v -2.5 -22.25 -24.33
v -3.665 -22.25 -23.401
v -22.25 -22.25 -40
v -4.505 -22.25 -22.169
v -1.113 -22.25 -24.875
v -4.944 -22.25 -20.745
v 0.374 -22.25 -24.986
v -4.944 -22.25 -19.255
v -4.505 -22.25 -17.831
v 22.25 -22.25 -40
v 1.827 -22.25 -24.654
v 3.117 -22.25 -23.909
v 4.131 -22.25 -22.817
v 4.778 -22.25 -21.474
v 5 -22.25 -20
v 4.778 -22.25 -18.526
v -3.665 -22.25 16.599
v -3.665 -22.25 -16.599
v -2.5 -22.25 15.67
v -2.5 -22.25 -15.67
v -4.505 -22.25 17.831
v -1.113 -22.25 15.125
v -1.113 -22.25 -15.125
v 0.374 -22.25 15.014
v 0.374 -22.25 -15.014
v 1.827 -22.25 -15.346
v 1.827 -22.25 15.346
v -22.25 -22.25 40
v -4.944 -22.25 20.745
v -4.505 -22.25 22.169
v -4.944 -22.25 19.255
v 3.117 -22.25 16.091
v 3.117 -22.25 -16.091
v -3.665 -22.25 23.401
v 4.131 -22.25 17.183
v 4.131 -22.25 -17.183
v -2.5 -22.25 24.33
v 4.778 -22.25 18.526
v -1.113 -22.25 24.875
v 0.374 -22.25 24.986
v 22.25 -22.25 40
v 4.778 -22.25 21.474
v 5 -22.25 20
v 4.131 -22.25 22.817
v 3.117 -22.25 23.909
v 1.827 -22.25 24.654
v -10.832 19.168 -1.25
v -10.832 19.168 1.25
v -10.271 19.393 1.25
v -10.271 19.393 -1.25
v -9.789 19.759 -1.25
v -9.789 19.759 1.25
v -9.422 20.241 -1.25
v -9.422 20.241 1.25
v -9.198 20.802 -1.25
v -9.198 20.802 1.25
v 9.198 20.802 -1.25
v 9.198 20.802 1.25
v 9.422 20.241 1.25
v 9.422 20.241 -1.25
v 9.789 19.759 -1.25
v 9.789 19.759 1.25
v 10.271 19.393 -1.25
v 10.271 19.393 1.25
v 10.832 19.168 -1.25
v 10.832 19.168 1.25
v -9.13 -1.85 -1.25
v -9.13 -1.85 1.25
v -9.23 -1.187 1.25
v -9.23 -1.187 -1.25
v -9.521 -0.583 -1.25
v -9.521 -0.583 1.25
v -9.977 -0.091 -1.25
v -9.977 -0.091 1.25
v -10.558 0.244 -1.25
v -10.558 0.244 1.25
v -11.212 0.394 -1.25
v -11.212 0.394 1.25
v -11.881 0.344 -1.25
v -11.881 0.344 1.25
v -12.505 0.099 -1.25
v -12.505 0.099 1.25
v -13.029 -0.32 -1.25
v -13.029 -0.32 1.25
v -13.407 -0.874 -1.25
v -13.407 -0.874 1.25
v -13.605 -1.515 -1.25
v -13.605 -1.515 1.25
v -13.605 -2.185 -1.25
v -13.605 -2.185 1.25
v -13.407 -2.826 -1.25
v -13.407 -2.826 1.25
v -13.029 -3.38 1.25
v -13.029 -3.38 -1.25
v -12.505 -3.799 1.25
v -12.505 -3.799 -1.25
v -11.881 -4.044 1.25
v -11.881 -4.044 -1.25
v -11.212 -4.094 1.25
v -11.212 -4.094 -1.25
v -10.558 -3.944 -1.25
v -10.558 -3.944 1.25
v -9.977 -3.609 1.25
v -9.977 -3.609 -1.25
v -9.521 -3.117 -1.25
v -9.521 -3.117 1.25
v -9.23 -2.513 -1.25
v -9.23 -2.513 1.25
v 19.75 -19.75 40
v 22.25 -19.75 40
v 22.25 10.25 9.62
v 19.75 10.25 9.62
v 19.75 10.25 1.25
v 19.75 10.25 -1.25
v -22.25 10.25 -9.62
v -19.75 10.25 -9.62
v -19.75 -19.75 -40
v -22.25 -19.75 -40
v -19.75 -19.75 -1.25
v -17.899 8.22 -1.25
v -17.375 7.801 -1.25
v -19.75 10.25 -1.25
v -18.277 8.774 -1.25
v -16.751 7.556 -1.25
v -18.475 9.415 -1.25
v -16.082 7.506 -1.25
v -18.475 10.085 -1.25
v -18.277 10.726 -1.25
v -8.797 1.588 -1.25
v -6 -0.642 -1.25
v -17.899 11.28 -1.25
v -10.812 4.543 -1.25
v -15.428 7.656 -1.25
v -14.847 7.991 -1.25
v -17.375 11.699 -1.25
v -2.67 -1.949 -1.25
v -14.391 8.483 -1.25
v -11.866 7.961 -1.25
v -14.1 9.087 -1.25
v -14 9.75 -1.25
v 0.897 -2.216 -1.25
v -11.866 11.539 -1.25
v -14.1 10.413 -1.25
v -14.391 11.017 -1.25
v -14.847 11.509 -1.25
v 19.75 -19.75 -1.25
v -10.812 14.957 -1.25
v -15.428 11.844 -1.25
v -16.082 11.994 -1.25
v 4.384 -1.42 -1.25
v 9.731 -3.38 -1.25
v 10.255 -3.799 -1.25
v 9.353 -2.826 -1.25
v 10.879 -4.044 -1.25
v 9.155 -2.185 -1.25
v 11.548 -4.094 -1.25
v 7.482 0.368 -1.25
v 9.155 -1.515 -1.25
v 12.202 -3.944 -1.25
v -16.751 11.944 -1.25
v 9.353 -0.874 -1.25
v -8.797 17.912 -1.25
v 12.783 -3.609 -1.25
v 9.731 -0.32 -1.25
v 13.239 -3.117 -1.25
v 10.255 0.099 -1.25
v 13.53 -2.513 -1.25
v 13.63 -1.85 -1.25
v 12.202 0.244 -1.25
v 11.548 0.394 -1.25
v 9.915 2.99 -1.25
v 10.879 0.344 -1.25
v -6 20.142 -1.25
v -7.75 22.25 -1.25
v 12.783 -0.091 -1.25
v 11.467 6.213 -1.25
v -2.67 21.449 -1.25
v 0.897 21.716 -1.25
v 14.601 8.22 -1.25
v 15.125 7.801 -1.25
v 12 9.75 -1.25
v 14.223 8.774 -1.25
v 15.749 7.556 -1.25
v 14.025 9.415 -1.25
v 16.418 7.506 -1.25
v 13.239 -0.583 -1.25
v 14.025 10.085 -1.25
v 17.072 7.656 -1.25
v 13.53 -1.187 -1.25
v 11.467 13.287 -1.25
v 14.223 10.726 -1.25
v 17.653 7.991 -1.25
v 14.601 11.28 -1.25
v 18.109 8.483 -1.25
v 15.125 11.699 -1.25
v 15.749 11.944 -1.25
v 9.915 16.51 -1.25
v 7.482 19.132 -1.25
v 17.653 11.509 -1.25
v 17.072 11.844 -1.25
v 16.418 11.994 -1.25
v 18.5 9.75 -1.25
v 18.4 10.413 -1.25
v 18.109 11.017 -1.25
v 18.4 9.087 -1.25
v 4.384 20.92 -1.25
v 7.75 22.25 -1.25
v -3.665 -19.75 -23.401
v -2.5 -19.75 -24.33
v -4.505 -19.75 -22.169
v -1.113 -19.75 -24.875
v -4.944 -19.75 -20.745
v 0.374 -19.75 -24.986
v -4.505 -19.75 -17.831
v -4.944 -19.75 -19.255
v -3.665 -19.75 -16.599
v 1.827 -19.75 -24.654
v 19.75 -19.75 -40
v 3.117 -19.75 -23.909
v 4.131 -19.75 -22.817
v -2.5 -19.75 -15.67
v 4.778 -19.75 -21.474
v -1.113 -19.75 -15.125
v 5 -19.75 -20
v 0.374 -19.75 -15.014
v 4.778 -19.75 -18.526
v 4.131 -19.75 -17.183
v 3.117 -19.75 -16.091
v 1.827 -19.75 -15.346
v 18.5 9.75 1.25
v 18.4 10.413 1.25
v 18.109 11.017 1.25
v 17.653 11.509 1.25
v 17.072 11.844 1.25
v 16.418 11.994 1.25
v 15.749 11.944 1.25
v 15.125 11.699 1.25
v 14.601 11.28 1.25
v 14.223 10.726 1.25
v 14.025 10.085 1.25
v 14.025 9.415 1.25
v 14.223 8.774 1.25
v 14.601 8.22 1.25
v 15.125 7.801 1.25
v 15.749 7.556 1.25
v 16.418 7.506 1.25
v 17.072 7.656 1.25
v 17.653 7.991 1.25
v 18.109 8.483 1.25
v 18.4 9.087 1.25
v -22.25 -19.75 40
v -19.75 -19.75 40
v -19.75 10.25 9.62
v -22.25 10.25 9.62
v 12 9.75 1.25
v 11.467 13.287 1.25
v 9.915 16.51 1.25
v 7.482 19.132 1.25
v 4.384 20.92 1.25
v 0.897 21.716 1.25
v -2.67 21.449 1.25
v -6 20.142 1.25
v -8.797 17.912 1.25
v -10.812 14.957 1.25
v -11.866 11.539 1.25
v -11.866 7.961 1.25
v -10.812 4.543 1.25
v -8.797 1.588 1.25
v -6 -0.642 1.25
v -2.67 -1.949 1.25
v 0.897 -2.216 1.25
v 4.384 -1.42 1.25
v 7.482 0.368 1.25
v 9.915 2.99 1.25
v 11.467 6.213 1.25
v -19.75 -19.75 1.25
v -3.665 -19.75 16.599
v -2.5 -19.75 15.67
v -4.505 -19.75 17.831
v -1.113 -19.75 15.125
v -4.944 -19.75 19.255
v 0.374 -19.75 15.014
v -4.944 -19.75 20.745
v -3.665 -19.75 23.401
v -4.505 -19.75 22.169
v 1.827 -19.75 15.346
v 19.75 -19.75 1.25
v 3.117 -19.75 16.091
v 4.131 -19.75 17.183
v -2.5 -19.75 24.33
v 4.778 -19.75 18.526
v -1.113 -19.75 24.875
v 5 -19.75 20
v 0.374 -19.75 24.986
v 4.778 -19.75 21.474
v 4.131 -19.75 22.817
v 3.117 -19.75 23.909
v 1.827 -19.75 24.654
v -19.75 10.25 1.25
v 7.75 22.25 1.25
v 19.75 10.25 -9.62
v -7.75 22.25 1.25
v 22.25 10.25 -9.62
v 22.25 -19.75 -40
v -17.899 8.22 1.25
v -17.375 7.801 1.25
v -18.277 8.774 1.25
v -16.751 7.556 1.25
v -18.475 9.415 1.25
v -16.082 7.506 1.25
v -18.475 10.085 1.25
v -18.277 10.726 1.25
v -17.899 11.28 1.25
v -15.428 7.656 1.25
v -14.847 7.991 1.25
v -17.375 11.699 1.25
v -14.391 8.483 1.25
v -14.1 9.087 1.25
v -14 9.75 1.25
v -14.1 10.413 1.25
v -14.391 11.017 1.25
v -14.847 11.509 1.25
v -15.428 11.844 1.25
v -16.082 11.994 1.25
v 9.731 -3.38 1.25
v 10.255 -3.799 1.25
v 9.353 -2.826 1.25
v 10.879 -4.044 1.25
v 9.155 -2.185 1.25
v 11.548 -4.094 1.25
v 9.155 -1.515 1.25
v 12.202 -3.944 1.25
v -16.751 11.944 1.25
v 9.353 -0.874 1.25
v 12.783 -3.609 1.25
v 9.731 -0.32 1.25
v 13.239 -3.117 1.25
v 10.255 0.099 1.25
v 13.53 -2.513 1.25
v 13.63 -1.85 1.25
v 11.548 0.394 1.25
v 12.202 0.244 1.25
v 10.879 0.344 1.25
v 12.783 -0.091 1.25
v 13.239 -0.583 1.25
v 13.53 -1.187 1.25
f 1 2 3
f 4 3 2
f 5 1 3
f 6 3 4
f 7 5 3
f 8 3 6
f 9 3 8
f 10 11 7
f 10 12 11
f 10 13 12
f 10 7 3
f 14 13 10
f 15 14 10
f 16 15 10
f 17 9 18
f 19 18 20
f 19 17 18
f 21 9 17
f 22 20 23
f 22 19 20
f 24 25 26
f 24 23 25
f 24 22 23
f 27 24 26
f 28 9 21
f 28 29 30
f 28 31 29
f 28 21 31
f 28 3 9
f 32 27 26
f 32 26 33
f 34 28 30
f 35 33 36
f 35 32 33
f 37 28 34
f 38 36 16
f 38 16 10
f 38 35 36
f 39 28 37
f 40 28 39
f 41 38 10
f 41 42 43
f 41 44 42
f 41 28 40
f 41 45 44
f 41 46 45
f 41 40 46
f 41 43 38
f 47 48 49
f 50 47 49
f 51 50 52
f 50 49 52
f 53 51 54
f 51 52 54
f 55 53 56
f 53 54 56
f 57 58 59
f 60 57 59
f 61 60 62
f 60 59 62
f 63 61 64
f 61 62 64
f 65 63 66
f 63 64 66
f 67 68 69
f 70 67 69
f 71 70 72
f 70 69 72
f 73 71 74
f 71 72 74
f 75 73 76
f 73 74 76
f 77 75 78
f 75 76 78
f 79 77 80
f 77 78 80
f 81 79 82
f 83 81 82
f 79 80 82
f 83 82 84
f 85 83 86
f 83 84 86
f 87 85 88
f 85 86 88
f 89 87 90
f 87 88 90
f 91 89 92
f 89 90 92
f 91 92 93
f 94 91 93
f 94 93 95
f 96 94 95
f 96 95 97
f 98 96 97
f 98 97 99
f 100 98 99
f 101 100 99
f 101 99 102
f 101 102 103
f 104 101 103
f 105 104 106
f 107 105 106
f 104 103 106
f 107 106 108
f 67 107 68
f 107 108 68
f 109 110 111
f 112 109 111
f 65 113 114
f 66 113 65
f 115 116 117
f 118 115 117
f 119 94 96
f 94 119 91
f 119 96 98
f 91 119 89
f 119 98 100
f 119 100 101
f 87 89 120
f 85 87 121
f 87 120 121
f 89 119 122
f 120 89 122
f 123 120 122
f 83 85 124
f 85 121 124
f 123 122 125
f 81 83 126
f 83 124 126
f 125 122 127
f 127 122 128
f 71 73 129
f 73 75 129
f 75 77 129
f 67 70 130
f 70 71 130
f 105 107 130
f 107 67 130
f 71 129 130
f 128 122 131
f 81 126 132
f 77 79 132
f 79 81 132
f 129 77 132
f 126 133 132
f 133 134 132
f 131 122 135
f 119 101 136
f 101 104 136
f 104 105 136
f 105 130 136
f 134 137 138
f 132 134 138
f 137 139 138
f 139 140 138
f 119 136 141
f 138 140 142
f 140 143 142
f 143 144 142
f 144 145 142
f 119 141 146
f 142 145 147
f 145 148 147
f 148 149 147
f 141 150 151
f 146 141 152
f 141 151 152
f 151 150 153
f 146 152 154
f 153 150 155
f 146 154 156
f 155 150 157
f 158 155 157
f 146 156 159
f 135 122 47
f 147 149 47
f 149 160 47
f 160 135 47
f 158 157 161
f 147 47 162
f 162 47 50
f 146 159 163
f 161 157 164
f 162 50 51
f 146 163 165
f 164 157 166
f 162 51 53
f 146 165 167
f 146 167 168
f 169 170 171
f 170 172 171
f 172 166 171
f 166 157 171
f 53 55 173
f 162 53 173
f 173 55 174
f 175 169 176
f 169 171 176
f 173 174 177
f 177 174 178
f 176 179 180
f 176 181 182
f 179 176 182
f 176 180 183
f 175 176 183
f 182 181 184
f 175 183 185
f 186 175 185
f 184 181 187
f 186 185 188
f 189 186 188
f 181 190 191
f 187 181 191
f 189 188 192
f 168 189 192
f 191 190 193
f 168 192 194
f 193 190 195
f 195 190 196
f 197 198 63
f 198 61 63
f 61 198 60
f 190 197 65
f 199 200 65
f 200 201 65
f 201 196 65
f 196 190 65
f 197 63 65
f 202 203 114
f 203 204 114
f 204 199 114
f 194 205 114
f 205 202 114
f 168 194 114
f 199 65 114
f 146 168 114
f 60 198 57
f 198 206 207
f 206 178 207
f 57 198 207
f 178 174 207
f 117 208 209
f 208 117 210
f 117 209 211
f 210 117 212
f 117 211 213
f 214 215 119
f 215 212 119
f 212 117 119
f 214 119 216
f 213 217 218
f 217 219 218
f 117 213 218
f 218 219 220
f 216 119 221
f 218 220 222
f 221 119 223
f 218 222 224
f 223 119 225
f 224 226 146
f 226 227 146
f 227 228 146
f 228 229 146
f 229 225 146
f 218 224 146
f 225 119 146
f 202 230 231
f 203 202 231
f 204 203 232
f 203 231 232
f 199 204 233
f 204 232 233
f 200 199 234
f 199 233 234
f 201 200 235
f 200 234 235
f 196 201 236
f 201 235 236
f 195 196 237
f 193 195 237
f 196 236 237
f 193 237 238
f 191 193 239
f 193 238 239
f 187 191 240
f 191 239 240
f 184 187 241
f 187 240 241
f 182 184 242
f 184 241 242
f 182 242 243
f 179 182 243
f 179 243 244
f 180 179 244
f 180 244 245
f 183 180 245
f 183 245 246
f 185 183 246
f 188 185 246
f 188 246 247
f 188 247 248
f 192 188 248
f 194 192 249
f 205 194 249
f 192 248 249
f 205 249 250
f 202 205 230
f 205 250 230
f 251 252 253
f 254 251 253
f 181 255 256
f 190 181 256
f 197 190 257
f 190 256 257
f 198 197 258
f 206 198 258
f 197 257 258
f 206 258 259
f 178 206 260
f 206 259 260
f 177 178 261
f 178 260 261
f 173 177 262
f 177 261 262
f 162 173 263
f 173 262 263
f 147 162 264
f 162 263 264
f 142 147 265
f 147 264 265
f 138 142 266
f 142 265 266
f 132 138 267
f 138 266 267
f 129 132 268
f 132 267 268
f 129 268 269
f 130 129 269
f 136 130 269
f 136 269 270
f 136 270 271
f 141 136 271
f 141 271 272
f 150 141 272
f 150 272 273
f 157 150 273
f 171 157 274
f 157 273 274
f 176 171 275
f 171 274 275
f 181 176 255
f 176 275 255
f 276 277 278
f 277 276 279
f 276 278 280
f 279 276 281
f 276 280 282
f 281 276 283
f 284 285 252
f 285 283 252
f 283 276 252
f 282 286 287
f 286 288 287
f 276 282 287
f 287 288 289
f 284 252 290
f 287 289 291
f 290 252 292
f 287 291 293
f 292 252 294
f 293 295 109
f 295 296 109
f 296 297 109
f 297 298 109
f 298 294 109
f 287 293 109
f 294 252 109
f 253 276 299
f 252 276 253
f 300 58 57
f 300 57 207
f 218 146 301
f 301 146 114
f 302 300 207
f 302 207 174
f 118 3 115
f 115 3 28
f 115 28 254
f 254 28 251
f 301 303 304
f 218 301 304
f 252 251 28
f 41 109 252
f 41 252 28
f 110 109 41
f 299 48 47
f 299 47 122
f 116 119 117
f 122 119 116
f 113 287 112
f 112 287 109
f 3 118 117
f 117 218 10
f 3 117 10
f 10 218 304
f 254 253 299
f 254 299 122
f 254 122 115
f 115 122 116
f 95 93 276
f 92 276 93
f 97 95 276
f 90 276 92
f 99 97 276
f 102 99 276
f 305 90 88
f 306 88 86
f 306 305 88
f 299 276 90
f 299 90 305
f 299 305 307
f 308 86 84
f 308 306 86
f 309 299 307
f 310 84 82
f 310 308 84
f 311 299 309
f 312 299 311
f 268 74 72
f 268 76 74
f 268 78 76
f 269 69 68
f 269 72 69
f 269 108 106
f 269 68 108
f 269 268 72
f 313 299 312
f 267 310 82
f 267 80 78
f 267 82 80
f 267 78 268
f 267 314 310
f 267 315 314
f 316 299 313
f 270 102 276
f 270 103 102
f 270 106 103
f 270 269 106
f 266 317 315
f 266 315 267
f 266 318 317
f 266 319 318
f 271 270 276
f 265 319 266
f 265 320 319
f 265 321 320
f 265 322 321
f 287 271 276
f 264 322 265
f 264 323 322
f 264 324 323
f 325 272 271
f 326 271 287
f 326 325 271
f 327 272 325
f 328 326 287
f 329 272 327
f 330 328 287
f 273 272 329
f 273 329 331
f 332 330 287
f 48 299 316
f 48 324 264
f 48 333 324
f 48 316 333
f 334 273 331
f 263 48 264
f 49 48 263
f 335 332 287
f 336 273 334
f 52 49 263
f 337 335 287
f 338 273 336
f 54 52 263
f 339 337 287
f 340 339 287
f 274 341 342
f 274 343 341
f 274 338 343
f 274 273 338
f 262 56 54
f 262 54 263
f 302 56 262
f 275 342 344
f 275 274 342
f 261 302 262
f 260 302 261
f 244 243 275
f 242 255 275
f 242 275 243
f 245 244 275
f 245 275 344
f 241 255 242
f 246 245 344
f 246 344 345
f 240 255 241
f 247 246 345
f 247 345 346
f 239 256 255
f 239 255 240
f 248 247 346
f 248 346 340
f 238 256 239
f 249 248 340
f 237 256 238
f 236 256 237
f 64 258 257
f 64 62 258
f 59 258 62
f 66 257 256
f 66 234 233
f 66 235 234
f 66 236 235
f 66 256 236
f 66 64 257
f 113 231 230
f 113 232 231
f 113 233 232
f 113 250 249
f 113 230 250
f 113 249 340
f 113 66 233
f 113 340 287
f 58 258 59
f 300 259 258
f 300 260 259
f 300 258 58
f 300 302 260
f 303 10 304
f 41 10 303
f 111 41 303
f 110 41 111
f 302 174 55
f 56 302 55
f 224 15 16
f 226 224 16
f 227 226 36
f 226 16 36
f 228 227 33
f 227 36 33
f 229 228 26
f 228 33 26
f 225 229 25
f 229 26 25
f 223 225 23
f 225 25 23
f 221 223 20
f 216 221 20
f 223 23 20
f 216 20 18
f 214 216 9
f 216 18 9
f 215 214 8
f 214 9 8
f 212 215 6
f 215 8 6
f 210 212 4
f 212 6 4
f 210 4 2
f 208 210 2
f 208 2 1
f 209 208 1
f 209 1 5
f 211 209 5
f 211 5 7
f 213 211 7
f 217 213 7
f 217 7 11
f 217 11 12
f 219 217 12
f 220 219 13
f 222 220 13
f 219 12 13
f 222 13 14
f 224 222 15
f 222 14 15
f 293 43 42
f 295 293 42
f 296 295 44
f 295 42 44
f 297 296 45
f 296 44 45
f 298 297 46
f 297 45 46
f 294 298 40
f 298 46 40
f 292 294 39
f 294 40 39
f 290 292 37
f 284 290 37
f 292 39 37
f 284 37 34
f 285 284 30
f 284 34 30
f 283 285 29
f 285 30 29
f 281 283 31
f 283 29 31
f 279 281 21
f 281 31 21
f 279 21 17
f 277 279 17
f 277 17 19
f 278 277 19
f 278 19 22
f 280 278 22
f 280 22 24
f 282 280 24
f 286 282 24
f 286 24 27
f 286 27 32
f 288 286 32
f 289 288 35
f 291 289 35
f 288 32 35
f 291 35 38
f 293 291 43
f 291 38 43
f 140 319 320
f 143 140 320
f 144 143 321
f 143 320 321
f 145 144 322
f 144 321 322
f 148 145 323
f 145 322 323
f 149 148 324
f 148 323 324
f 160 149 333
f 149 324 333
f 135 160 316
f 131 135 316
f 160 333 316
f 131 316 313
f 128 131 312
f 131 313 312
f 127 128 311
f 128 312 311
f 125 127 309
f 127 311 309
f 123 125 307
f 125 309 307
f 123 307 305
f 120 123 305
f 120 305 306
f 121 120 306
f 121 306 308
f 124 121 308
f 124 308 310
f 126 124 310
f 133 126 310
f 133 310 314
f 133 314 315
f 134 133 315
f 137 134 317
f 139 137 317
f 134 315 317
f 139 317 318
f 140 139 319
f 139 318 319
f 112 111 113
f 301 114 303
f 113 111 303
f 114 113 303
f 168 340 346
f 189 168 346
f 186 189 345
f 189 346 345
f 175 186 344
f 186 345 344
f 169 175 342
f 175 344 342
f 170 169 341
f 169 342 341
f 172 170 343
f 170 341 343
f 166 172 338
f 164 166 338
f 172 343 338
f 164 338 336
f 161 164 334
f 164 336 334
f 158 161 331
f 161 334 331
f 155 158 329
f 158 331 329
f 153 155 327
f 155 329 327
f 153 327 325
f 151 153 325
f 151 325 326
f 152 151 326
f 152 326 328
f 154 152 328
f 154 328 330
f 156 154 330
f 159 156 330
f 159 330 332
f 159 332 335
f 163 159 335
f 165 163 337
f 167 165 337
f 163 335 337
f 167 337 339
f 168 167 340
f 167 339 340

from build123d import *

# Parameters (mm, degrees)
CROQUIS1_W                   = 44.5
CROQUIS1_H                   = 44.5
CROQUIS1_W_2                 = 39.5
CROQUIS1_H_2                 = 39.5
SALIENTE_EXTRUIR1_DEPTH      = 40
SALIENTE_EXTRUIR1_DEPTH_BACK = 40
CORTAR_EXTRUIR1_DEPTH        = 44.5
SALIENTE_EXTRUIR2_DEPTH      = 1.25
SALIENTE_EXTRUIR2_DEPTH_BACK = 1.25
CROQUIS4_R                   = 5
CORTAR_EXTRUIR2_DEPTH        = 2.5
CROQUIS7_R                   = 12
CORTAR_EXTRUIR5_DEPTH        = 2.5
CROQUIS8_R                   = 2.25
CORTAR_EXTRUIR6_DEPTH        = 2.5


with BuildPart() as part:
    # Croquis1 → Saliente-Extruir1 (new body, two sides)
    with BuildSketch(Plane.XY) as saliente_extruir1_sk:
        Rectangle(CROQUIS1_W, CROQUIS1_H)
        Rectangle(CROQUIS1_W_2, CROQUIS1_H_2, mode=Mode.SUBTRACT)
    extrude(amount=SALIENTE_EXTRUIR1_DEPTH)
    extrude(saliente_extruir1_sk.sketch, amount=-SALIENTE_EXTRUIR1_DEPTH_BACK)

    # Croquis2 → Cortar-Extruir1 (cut)
    with BuildSketch(Plane(origin=(22.25, 0, 0), x_dir=(0, 0, -1), z_dir=(1, 0, 0))):
        Polygon((-9.620253165, 10.25), (9.620253165, 10.25), (40, -19.75), (40, 22.25), (-40, 22.25), (-40, -19.75), align=None)
    extrude(amount=-CORTAR_EXTRUIR1_DEPTH, mode=Mode.SUBTRACT)

    # Croquis3 → Saliente-Extruir2 (add, two sides)
    with BuildSketch(Plane.XY) as saliente_extruir2_sk:
        Polygon((19.75, -19.75), (19.75, 10.25), (7.75, 22.25), (-7.75, 22.25), (-19.75, 10.25), (-19.75, -19.75), align=None)
    extrude(amount=SALIENTE_EXTRUIR2_DEPTH)
    extrude(saliente_extruir2_sk.sketch, amount=-SALIENTE_EXTRUIR2_DEPTH_BACK)

    # Croquis4 → Cortar-Extruir2 (cut)
    with BuildSketch(Plane.XZ.offset(22.25)):
        with Locations((0, -20)):
            Circle(CROQUIS4_R)
        with Locations((0, 20)):
            Circle(CROQUIS4_R)
    extrude(amount=-CORTAR_EXTRUIR2_DEPTH, mode=Mode.SUBTRACT)

    # Croquis7 → Cortar-Extruir5 (cut)
    with BuildSketch(Plane.XY.offset(1.25)):
        with Locations((0, 9.75)):
            Circle(CROQUIS7_R)
    extrude(amount=-CORTAR_EXTRUIR5_DEPTH, mode=Mode.SUBTRACT)

    # Croquis8 → Cortar-Extruir6 (cut)
    with BuildSketch(Plane.XY.offset(1.25)):
        with Locations((-11.37991652, 21.35)):
            Circle(CROQUIS8_R)
        with Locations((11.37991652, 21.35)):
            Circle(CROQUIS8_R)
        with Locations((-16.25, 9.75)):
            Circle(CROQUIS8_R)
        with Locations((16.25, 9.75)):
            Circle(CROQUIS8_R)
        with Locations((-11.37991652, -1.85)):
            Circle(CROQUIS8_R)
        with Locations((11.37991652, -1.85)):
            Circle(CROQUIS8_R)
    extrude(amount=-CORTAR_EXTRUIR6_DEPTH, mode=Mode.SUBTRACT)


solid = part.part
